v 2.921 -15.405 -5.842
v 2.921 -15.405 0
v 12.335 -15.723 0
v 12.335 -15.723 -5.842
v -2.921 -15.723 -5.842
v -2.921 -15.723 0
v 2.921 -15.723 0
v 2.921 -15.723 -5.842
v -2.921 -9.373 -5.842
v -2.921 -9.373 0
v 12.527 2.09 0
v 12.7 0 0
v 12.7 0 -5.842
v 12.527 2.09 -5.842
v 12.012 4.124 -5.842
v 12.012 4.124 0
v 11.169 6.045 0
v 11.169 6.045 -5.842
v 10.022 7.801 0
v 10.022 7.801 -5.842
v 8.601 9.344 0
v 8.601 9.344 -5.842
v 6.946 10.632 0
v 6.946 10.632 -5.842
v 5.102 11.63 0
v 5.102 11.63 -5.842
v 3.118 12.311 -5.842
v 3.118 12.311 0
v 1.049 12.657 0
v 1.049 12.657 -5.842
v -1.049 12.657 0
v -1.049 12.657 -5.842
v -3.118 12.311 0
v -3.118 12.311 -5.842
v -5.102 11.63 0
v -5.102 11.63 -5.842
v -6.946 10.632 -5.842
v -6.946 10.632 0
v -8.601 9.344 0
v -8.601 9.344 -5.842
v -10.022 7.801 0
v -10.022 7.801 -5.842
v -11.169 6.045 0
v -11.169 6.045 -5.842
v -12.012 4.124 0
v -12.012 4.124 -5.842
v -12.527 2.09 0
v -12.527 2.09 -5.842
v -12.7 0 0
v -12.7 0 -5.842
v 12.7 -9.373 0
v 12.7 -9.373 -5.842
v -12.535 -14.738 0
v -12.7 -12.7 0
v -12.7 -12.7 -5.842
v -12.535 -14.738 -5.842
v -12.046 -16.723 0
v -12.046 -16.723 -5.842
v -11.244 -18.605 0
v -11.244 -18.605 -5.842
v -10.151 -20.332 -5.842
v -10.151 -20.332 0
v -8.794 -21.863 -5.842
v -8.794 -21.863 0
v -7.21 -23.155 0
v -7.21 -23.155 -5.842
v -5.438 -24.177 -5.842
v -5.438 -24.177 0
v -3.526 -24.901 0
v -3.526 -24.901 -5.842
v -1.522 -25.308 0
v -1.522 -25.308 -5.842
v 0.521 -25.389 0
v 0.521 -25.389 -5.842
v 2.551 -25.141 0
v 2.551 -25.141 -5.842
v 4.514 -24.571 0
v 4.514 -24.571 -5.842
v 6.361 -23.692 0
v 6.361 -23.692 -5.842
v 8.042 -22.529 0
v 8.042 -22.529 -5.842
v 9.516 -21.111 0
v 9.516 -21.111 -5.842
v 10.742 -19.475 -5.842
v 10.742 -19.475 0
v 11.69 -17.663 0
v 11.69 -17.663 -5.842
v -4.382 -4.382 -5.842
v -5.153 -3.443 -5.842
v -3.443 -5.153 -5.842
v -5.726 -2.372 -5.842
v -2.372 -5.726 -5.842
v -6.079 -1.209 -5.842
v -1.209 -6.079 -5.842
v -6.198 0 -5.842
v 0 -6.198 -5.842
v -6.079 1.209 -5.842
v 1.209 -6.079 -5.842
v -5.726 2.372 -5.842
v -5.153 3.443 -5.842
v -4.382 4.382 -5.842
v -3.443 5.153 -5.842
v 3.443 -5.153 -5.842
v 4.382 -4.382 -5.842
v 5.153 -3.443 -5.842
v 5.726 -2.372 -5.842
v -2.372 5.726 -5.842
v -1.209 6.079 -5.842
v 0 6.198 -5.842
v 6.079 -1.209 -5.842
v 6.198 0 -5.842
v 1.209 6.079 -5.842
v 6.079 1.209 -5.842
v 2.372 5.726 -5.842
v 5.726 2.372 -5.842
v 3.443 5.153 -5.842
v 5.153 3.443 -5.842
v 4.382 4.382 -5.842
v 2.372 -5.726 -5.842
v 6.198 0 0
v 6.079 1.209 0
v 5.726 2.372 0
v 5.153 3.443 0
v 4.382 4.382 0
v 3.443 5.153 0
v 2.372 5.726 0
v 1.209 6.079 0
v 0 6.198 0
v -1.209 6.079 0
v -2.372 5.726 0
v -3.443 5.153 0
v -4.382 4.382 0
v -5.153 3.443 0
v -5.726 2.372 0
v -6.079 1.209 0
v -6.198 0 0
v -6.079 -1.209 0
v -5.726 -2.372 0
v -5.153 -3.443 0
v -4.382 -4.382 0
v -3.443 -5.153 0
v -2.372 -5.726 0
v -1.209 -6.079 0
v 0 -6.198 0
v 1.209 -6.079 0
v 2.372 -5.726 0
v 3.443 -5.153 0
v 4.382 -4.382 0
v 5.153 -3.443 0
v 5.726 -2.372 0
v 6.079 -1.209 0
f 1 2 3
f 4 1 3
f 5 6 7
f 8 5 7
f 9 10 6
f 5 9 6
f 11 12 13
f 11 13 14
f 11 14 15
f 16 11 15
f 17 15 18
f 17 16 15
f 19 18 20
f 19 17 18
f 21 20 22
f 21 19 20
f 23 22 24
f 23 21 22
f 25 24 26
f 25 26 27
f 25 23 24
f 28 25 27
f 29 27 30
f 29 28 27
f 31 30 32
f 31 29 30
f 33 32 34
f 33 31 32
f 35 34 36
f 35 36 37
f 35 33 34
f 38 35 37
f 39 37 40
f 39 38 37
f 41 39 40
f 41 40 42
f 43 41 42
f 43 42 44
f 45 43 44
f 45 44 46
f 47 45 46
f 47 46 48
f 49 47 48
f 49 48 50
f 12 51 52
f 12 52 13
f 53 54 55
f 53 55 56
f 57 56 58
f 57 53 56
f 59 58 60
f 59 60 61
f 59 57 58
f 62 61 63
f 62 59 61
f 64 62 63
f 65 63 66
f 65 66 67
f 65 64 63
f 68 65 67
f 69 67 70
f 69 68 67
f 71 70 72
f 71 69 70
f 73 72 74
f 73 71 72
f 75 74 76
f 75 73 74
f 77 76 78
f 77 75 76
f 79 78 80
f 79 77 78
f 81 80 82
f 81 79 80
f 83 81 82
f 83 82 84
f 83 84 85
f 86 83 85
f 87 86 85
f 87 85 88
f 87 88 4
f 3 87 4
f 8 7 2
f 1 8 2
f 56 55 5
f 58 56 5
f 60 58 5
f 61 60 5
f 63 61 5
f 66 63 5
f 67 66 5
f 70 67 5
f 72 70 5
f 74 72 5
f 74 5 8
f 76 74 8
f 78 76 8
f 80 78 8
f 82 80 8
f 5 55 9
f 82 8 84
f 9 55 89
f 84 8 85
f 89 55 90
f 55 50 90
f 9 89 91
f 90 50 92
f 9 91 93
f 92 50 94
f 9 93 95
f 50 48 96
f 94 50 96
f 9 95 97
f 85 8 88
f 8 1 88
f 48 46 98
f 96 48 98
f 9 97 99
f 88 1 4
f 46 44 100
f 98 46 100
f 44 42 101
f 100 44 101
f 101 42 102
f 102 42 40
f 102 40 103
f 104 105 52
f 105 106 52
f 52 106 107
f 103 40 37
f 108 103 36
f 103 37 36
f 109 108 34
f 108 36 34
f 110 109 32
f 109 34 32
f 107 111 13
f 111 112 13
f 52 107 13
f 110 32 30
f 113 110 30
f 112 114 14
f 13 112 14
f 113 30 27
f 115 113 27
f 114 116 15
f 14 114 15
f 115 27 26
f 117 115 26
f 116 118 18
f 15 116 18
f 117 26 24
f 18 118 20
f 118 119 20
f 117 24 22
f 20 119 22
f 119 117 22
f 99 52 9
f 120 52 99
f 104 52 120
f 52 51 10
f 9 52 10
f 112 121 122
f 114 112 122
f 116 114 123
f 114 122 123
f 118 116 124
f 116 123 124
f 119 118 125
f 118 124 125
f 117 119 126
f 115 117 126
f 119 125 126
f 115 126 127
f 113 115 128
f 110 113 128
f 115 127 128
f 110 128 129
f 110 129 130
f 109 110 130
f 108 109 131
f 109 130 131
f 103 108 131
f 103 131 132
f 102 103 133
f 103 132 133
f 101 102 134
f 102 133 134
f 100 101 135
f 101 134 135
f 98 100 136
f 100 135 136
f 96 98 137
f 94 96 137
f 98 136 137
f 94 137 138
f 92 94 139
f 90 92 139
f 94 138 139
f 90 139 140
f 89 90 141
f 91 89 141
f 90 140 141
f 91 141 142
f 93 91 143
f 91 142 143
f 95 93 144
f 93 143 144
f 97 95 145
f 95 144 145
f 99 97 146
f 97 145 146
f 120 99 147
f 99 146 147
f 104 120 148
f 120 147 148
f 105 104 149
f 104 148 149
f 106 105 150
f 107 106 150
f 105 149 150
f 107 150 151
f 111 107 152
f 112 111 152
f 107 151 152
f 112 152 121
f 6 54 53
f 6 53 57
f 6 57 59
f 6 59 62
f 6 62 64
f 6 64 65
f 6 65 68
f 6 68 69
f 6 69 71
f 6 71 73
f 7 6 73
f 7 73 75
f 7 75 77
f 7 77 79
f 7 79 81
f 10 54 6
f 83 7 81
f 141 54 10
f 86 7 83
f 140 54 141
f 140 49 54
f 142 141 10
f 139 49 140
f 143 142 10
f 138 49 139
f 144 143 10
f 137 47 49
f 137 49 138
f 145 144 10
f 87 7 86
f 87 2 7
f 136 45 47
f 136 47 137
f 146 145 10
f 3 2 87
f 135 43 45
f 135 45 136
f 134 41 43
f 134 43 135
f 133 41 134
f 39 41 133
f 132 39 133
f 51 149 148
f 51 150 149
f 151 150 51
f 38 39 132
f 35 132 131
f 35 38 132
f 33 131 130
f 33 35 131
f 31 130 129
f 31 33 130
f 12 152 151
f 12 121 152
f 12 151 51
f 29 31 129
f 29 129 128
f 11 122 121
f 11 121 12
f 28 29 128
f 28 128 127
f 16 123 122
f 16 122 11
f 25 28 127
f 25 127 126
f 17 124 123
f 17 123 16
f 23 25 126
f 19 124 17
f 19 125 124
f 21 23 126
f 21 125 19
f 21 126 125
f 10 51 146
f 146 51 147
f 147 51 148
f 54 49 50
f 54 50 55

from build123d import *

# Parameters (mm, degrees)
F0_R     = 6.1976
F1_DEPTH = 5.842
F3_DEPTH = 5.842


# Not quite as in the source:
# - a feature names something its author has since deleted; it is built from what else it names


with BuildPart() as f1:
    # F0 (on Top) → F1 (new body)
    with BuildSketch(Plane.XY):
        with BuildLine():
            ThreePointArc((-12.7, 0), (0, -12.7), (12.7, 0))
            ThreePointArc((12.7, 0), (0, 12.7), (-12.7, 0))
        make_face()
        Circle(F0_R, mode=Mode.SUBTRACT)
        with BuildLine():
            Line((12.7, -12.7), (12.7, 0))
            ThreePointArc((12.7, 0), (0, -12.7), (-12.7, 0))
            Line((-12.7, 0), (-12.7, -12.7))
            ThreePointArc((-12.7, -12.7), (0, -25.4), (12.7, -12.7))
        make_face()
    extrude(amount=-F1_DEPTH)

    # F2 (on face) → F3 (cut, through all)
    with BuildSketch(Plane.XY):
        with BuildLine():
            Line((12.7, -9.3726), (-2.921, -9.3726))
            Line((-2.921, -9.3726), (-2.921, -15.7226))
            Line((-2.921, -15.7226), (2.921, -15.7226))
            Line((2.921, -15.7226), (2.921, -15.4051))
            Line((2.921, -15.4051), (12.3350674599, -15.7226))
            ThreePointArc((12.3350674599, -15.7226), (12.6084367933, -14.2222751491), (12.7, -12.7))
            Line((12.7, -12.7), (12.7, -9.3726))
        make_face()
    extrude(amount=-F3_DEPTH, mode=Mode.SUBTRACT)


solid = f1.part
